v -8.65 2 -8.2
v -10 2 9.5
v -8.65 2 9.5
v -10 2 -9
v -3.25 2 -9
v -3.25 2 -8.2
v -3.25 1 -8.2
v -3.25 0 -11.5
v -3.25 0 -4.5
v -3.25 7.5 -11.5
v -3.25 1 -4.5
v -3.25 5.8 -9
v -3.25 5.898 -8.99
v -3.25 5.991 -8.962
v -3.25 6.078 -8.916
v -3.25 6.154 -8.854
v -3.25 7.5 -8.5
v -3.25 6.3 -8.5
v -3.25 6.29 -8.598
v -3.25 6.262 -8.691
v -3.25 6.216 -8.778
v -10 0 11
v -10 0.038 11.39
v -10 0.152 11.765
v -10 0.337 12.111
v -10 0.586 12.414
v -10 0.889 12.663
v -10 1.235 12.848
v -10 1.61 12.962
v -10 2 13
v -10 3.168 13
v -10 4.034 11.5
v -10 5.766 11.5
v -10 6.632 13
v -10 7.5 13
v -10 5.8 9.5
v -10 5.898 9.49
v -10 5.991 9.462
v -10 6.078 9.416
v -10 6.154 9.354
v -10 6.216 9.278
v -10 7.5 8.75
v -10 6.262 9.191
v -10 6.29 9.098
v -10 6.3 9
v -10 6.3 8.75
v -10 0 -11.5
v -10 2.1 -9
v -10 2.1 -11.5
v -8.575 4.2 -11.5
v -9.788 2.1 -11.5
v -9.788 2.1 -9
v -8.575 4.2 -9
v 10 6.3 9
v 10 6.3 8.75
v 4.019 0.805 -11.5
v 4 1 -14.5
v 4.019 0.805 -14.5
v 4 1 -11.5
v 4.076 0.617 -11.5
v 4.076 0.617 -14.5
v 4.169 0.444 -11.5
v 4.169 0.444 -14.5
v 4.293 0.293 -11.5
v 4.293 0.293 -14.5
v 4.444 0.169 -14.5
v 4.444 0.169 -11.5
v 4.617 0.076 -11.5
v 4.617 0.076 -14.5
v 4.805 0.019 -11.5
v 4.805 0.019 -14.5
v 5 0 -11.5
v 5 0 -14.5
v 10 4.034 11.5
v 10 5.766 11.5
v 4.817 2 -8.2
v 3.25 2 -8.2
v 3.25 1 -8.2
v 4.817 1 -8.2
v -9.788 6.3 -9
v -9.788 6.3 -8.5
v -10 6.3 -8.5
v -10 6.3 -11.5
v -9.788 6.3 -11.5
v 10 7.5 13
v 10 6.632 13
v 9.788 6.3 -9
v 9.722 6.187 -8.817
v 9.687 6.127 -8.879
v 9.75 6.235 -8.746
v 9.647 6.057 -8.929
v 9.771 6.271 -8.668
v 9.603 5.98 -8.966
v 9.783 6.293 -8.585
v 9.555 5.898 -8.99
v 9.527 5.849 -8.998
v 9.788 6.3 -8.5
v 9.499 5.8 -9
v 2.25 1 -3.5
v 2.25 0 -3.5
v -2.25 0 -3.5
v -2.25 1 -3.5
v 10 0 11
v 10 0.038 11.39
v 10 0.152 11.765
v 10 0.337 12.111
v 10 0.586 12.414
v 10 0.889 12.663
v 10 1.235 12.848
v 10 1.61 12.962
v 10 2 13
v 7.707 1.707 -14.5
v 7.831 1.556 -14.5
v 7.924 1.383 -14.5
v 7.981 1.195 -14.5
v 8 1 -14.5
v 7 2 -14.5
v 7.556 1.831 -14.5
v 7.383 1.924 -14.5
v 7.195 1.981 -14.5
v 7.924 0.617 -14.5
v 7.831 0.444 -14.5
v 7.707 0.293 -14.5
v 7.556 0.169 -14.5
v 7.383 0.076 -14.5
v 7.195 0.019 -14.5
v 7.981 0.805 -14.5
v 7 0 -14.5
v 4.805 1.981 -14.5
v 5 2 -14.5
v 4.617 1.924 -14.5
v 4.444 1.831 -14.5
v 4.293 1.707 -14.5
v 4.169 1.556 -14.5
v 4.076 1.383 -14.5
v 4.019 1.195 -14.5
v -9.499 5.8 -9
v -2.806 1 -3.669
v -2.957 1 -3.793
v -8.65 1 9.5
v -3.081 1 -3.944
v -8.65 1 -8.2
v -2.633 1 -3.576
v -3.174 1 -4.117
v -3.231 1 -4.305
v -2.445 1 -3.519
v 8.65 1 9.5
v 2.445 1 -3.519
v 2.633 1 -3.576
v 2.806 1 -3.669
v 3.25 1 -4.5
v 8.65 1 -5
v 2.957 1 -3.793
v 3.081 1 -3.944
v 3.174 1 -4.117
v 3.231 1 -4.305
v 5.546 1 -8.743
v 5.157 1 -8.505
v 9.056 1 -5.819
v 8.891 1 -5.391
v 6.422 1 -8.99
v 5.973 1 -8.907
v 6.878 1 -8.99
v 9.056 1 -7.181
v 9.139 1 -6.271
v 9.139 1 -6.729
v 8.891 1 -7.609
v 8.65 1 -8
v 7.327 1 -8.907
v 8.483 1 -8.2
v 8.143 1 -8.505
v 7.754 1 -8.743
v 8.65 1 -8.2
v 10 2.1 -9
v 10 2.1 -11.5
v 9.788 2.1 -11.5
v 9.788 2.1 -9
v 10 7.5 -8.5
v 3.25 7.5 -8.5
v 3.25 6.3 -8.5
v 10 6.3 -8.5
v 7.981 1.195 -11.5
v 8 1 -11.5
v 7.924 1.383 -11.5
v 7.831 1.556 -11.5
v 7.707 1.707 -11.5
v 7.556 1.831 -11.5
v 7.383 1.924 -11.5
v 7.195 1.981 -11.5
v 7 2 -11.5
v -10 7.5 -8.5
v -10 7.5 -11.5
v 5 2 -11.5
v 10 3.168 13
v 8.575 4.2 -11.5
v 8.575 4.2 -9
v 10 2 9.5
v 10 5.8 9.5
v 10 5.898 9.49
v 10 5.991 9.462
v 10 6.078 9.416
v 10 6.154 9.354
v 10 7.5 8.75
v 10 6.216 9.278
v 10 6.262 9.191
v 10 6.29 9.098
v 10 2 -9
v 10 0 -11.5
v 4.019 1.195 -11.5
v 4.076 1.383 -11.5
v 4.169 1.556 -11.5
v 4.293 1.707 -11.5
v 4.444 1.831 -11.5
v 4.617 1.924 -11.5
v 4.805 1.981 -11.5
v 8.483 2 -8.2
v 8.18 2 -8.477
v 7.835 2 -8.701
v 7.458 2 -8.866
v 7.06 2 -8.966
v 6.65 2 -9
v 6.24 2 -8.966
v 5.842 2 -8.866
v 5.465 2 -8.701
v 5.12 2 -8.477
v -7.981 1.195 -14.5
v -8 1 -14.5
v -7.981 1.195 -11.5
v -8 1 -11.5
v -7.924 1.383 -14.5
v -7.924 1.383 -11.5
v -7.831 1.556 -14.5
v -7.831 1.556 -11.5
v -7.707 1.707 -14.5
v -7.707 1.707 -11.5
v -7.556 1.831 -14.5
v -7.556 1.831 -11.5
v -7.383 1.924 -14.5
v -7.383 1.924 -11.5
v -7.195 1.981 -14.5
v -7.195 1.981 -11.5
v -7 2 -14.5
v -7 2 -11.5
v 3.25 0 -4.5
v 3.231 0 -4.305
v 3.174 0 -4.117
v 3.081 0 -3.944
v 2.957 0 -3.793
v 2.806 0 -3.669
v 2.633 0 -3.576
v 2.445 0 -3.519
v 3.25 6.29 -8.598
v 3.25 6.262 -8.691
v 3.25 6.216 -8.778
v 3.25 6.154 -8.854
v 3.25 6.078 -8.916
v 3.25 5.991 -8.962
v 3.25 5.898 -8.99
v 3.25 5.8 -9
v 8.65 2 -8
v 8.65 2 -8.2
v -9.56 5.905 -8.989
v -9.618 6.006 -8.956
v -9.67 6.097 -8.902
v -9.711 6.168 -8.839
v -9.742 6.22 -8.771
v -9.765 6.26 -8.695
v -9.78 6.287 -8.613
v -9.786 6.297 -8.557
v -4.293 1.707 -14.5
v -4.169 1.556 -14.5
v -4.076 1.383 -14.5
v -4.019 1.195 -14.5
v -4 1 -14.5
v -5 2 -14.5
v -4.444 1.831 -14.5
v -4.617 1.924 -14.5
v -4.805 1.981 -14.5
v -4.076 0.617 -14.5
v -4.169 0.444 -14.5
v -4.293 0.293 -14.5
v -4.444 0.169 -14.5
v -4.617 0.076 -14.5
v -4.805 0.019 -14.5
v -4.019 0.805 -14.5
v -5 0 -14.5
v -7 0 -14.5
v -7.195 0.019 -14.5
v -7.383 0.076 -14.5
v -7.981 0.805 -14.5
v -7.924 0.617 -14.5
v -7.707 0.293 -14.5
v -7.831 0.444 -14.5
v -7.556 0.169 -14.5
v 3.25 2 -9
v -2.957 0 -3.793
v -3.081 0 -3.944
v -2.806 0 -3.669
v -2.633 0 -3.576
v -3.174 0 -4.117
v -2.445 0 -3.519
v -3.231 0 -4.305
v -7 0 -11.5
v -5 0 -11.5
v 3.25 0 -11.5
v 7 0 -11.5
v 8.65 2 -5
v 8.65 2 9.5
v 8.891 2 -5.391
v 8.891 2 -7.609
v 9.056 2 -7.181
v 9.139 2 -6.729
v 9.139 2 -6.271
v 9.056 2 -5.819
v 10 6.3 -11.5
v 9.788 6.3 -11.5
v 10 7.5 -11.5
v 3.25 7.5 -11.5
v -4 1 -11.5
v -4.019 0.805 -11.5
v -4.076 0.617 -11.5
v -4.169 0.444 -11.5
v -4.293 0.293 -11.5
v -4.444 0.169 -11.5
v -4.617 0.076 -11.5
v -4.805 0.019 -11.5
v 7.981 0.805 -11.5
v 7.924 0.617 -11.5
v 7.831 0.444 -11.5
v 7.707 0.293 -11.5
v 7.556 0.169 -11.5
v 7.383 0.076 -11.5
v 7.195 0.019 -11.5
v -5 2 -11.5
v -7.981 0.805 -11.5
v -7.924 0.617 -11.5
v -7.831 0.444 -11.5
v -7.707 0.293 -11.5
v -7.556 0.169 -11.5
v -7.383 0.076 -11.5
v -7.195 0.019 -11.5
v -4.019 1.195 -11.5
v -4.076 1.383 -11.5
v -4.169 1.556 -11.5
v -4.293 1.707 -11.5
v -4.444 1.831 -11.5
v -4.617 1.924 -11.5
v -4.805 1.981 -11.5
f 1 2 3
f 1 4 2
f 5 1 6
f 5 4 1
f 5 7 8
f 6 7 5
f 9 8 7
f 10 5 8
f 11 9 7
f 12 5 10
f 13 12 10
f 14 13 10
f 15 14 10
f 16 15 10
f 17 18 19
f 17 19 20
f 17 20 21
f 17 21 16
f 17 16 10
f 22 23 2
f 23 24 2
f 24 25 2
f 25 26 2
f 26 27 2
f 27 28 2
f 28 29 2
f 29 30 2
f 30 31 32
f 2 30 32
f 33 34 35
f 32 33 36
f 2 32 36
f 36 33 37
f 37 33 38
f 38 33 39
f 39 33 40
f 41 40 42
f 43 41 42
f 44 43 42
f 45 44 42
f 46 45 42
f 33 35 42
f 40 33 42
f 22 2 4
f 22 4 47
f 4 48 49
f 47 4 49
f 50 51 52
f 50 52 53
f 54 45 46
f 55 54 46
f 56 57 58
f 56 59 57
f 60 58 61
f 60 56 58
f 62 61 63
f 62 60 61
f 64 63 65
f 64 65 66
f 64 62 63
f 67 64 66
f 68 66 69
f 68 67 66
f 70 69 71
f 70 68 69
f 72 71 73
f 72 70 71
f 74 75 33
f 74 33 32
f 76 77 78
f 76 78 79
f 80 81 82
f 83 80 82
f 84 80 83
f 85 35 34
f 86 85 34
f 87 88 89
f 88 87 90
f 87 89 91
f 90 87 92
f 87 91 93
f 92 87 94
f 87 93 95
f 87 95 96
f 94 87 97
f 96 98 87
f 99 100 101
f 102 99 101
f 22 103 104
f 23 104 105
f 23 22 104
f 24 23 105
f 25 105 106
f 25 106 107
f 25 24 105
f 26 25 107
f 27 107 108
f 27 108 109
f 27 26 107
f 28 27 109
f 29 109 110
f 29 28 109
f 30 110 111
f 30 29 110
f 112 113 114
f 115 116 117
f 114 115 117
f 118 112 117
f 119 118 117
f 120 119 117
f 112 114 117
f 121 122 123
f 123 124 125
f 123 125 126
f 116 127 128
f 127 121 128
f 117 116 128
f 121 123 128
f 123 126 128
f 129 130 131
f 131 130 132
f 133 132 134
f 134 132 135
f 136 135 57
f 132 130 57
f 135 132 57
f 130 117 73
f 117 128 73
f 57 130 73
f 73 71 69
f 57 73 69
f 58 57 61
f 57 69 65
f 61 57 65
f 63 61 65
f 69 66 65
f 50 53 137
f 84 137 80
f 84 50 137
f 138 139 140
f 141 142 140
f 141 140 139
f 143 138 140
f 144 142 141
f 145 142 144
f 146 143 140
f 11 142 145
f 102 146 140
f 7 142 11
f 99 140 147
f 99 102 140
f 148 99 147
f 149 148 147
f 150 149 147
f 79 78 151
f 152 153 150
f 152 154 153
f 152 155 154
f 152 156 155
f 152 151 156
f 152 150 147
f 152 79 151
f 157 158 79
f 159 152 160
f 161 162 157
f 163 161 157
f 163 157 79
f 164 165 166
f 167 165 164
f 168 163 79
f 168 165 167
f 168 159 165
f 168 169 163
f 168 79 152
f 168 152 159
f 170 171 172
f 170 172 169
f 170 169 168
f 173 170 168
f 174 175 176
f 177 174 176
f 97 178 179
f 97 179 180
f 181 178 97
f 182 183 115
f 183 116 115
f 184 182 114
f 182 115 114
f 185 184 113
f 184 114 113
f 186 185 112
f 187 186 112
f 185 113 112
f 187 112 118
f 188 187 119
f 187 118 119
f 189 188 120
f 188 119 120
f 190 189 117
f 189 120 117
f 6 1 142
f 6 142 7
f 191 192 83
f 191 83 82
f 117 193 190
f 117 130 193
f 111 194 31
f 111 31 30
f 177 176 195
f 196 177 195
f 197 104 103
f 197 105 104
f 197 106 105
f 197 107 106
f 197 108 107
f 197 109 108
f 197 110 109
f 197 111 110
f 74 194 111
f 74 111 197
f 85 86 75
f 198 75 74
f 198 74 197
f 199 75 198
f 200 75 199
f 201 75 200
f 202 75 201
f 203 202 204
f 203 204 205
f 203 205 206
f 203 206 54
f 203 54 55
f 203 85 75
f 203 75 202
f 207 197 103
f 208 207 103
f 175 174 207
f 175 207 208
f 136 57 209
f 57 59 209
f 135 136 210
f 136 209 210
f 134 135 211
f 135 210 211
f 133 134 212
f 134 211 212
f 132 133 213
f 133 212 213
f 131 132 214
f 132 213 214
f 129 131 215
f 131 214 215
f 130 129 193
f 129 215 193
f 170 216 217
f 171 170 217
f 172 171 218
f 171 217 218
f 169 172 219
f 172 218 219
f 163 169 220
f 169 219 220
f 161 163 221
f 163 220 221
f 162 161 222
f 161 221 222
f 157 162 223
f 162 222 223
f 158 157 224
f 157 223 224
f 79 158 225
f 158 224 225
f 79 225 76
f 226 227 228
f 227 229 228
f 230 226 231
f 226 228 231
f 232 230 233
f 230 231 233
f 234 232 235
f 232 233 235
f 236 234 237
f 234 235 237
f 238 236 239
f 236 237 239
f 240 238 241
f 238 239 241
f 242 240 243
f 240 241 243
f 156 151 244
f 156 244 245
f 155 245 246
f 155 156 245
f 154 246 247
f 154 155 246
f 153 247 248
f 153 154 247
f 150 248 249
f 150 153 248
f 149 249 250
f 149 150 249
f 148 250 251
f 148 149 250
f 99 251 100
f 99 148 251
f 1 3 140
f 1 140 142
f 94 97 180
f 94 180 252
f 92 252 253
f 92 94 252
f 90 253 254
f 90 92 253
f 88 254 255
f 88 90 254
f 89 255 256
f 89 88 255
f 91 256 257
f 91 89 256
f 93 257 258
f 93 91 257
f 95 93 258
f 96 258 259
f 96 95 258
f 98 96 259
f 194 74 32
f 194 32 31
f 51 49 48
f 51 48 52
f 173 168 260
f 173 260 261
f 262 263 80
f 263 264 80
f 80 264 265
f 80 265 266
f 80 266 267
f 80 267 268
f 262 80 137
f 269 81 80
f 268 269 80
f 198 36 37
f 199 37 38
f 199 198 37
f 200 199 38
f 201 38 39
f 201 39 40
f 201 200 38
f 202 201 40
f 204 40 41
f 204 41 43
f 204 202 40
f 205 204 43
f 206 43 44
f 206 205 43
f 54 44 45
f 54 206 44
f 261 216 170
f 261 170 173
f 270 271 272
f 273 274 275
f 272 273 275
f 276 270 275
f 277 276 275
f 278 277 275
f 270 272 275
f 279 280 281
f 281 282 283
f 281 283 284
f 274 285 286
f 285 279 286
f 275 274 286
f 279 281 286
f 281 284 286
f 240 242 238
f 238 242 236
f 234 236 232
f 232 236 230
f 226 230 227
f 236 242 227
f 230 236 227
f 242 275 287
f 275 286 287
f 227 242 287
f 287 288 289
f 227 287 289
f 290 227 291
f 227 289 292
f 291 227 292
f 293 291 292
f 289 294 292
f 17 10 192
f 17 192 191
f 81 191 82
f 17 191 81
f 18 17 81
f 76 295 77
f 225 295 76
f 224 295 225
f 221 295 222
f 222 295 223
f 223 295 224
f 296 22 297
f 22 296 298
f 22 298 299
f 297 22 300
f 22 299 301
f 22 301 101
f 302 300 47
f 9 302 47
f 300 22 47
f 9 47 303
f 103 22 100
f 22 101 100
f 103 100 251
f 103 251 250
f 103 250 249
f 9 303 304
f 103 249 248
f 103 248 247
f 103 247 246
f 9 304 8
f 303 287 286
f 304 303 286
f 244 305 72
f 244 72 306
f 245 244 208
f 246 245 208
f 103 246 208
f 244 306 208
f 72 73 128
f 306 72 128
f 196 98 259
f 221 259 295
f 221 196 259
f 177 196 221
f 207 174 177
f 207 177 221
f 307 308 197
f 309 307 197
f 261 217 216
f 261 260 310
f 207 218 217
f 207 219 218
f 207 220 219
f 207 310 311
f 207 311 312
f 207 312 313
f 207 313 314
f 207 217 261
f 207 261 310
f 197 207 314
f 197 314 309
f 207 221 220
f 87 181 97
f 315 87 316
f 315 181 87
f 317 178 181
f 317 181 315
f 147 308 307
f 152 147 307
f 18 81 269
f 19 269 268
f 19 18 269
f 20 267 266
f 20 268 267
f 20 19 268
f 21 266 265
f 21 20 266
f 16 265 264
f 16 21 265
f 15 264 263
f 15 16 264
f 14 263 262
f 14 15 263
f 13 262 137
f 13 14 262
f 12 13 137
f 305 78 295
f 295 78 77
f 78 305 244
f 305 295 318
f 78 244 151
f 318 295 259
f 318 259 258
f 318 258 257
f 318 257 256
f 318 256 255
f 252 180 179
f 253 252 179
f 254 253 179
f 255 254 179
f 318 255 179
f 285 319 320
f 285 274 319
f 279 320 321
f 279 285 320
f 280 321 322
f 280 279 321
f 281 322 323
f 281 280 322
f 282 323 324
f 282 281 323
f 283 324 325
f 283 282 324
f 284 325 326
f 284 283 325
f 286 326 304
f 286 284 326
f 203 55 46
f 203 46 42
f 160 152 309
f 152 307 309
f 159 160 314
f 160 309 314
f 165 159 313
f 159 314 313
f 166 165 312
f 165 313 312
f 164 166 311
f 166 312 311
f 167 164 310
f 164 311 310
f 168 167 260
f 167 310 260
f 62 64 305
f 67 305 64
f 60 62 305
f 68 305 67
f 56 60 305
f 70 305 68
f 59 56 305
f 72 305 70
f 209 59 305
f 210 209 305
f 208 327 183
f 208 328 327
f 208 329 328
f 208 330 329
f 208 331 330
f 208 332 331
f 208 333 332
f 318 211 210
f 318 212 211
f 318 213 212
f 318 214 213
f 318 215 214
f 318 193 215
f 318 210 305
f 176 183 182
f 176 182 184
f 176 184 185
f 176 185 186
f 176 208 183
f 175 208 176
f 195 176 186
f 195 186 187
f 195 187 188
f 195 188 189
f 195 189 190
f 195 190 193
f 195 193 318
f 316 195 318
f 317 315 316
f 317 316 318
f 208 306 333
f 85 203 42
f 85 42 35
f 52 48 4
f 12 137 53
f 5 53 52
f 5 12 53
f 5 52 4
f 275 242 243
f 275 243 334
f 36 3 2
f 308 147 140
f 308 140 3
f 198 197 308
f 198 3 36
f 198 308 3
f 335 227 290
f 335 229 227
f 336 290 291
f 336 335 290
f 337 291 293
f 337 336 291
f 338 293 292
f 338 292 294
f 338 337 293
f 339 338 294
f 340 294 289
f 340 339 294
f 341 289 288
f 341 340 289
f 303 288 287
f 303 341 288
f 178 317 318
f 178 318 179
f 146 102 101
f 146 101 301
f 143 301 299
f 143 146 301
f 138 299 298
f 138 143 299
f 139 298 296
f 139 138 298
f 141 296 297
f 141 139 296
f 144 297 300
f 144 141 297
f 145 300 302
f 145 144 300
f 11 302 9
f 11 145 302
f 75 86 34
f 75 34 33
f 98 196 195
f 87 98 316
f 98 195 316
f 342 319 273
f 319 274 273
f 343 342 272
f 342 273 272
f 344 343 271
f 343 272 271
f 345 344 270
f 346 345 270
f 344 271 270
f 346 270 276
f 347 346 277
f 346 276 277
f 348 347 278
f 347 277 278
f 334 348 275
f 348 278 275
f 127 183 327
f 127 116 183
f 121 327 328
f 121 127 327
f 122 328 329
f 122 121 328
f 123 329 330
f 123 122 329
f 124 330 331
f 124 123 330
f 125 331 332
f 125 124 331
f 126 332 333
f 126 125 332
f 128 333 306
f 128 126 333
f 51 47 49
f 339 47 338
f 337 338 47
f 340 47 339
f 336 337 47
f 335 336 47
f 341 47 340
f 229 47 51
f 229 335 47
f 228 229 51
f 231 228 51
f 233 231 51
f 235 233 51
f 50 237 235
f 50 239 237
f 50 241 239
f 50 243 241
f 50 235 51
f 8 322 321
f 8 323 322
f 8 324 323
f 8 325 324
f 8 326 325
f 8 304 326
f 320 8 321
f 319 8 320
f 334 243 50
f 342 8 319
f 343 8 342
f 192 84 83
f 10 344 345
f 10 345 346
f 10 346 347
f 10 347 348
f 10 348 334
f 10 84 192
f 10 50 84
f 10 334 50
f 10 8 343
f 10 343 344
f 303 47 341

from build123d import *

# Parameters (mm, degrees)
BOSS_EXTRUDE1_DEPTH = 2
FILLET1_R           = 1
SKETCH4_W           = 17.3
SKETCH4_H           = 17.7
CUT_EXTRUDE3_DEPTH  = 1
BOSS_EXTRUDE3_REACH = 26.784
CUT_EXTRUDE5_REACH  = 21.144
SKETCH7_W           = 6.5
SKETCH7_H           = 3
CUT_EXTRUDE6_DEPTH  = 3.5
FILLET3_R           = 0.5
BOSS_EXTRUDE4_DEPTH = 20
SKETCH10_R          = 2.5
CUT_EXTRUDE7_DEPTH  = 1
FILLET4_R           = 2


# Some blends are built 0.0001 mm under size
with BuildPart() as part:
    # Sketch1 → Boss-Extrude1 (new body)
    with BuildSketch(Plane(origin=(0, 0, 0), x_dir=(1, 0, 0), z_dir=(0, 1, 0))):
        Polygon((10, -11.5), (10, 11.5), (8, 11.5), (8, 14.5), (4, 14.5), (4, 11.5), (3.25, 11.5), (3.25, 3.5), (-3.25, 3.5), (-3.25, 11.5), (-4, 11.5), (-4, 14.5), (-8, 14.5), (-8, 11.5), (-10, 11.5), (-10, -11.5), align=None)
    extrude(amount=BOSS_EXTRUDE1_DEPTH)

    # Fillet1
    fillet1_edges = [part.edges().sort_by_distance(p)[0] for p in [
        (-3.25, 1, -3.5),
        (3.25, 1, -3.5),
        (-8, 0, -13),
        (-8, 2, -13),
        (4, 0, -13),
        (4, 2, -13),
        (8, 0, -13),
        (8, 2, -13),
        (-4, 0, -13),
        (-4, 2, -13),
    ]]
    fillet(fillet1_edges, radius=FILLET1_R - 0.0001)  # a hair under: the kernel refuses the full size

    # Sketch4 → Cut-Extrude3 (cut)
    with BuildSketch(Plane(origin=(0, 2, 0), x_dir=(1, 0, 0), z_dir=(0, 1, 0))):
        with Locations((0, -0.65)):
            Rectangle(SKETCH4_W, SKETCH4_H)
    extrude(amount=-CUT_EXTRUDE3_DEPTH, mode=Mode.SUBTRACT)

    # Boss-Extrude3: up to this face of the body (flat: up to its plane)
    boss_extrude3_end = Plane(part.part.faces().sort_by_distance((-10, 1, 0))[0])
    # Sketch5 → Boss-Extrude3 (add, up to the picked face)
    with BuildSketch(Plane(origin=(10, 0, 0), x_dir=(0, 0, -1), z_dir=(1, 0, 0)), mode=Mode.PRIVATE) as boss_extrude3_sk1:
        Polygon((-11.5, 2), (-9.5, 2), (-9.5, 6.3), (-8.75, 6.3), (-8.75, 7.5), (-11.5, 7.5), align=None)
    boss_extrude3_tool1 = split(extrude(boss_extrude3_sk1.sketch, amount=-BOSS_EXTRUDE3_REACH, mode=Mode.PRIVATE), bisect_by=boss_extrude3_end, keep=Keep.BOTH, mode=Mode.PRIVATE)
    # Sketch5 → Boss-Extrude3 (add, up to the picked face)
    with BuildSketch(Plane(origin=(10, 0, 0), x_dir=(0, 0, -1), z_dir=(1, 0, 0)), mode=Mode.PRIVATE) as boss_extrude3_sk2:
        Polygon((9, 2), (11.5, 2), (11.5, 7.5), (8.5, 7.5), (8.5, 6.3), (9, 6.3), align=None)
    boss_extrude3_tool2 = split(extrude(boss_extrude3_sk2.sketch, amount=-BOSS_EXTRUDE3_REACH, mode=Mode.PRIVATE), bisect_by=boss_extrude3_end, keep=Keep.BOTH, mode=Mode.PRIVATE)
    add(boss_extrude3_tool1.solids().sort_by(Axis((10, 4.912605, 10.396008), (-1, 0, 0)))[0])
    add(boss_extrude3_tool2.solids().sort_by(Axis((10, 4.839895, -10.187282), (-1, 0, 0)))[0])

    # Sketch7 → Cut-Extrude5 (cut, up to next)
    with BuildSketch(Plane(origin=(0, 7.5, 0), x_dir=(1, 0, 0), z_dir=(0, 1, 0)), mode=Mode.PRIVATE) as cut_extrude5_sk1:
        with Locations((0, 10)):
            Rectangle(SKETCH7_W, SKETCH7_H)
    cut_extrude5_tool1 = extrude(cut_extrude5_sk1.sketch, amount=-CUT_EXTRUDE5_REACH, mode=Mode.PRIVATE) & part.part
    add(cut_extrude5_tool1.solids().sort_by_distance((0, 7.5, -10))[0], mode=Mode.SUBTRACT)

    # Sketch8 → Cut-Extrude6 (cut)
    with BuildSketch(Plane(origin=(0, 0, -11.5), x_dir=(-1, 0, 0), z_dir=(0, 0, -1))):
        Polygon((-8.575128869, 4.2), (-9.787564435, 6.3), (-12.212435565, 6.3), (-13.424871131, 4.2), (-12.212435565, 2.1), (-9.787564435, 2.1), align=None)
        Polygon((12.212435565, 2.1), (9.787564435, 2.1), (8.575128869, 4.2), (9.787564435, 6.3), (12.212435565, 6.3), (13.424871131, 4.2), align=None)
    extrude(amount=-CUT_EXTRUDE6_DEPTH, mode=Mode.SUBTRACT)

    # Fillet3
    # the kernel refuses this fillet: 0.5 mm, written as the material it adds along each edge
    with BuildSketch(Plane(origin=(10, 6.3, 9.5), x_dir=(0, -1, 0), z_dir=(-1, 0, 0))) as fillet3_piece_1:
        with BuildLine():
            CenterArc((FILLET3_R, -FILLET3_R), FILLET3_R, 90, 90)
            Line((0, -FILLET3_R), (0, 0))
            Line((0, 0), (FILLET3_R, 0))
        make_face()
    extrude(amount=20)
    with BuildSketch(Plane(origin=(11.037564435, 6.3, -9), x_dir=(0, -1, 0), z_dir=(-1, 0, 0))) as fillet3_piece_2_section:
        with BuildLine():
            CenterArc((FILLET3_R, FILLET3_R), FILLET3_R, 180, 90)
            Line((0, FILLET3_R), (0, 0))
            Line((0, 0), (FILLET3_R, 0))
        make_face()
    fillet3_piece_2 = extrude(amount=7.787564435, mode=Mode.PRIVATE)
    fillet3_piece_2 = split(fillet3_piece_2, bisect_by=Plane(origin=(8.913707181, 4.786434839, -8.886190127), z_dir=(-0.8660254037844385, 0.5000000000000003, 0)), keep=Keep.TOP, mode=Mode.PRIVATE)
    add(fillet3_piece_2)
    with BuildSketch(Plane(origin=(-3.25, 6.3, -9), x_dir=(0, -1, 0), z_dir=(-1, 0, 0))) as fillet3_piece_3_section:
        with BuildLine():
            CenterArc((FILLET3_R, FILLET3_R), FILLET3_R, 180, 90)
            Line((0, FILLET3_R), (0, 0))
            Line((0, 0), (FILLET3_R, 0))
        make_face()
    fillet3_piece_3 = extrude(amount=7.787564435, mode=Mode.PRIVATE)
    fillet3_piece_3 = split(fillet3_piece_3, bisect_by=Plane(origin=(-8.913707181, 4.786434839, -8.886190127), z_dir=(0.8660254037844393, 0.49999999999999906, 0)), keep=Keep.TOP, mode=Mode.PRIVATE)
    add(fillet3_piece_3)

    # Sketch9 → Boss-Extrude4 (add)
    with BuildSketch(Plane(origin=(10, 0, 0), x_dir=(0, 0, -1), z_dir=(1, 0, 0))):
        Polygon((-13, 6.632050808), (-11.5, 5.766025404), (-11.5, 7.5), (-13, 7.5), align=None)
        Polygon((-11.5, 0), (-11.5, 4.033974596), (-13, 3.167949192), (-13, 0), align=None)
    extrude(amount=-BOSS_EXTRUDE4_DEPTH)

    # Sketch10 → Cut-Extrude7 (cut)
    with BuildSketch(Plane(origin=(0, 2, 0), x_dir=(1, 0, 0), z_dir=(0, 1, 0))):
        with Locations((6.65, 6.5)):
            Circle(SKETCH10_R)
    extrude(amount=-CUT_EXTRUDE7_DEPTH, mode=Mode.SUBTRACT)

    # Fillet4
    fillet4_edges = [part.edges().sort_by_distance(p)[0] for p in [
        (0, 0, 13),
    ]]
    fillet(fillet4_edges, radius=FILLET4_R)


solid = part.part
